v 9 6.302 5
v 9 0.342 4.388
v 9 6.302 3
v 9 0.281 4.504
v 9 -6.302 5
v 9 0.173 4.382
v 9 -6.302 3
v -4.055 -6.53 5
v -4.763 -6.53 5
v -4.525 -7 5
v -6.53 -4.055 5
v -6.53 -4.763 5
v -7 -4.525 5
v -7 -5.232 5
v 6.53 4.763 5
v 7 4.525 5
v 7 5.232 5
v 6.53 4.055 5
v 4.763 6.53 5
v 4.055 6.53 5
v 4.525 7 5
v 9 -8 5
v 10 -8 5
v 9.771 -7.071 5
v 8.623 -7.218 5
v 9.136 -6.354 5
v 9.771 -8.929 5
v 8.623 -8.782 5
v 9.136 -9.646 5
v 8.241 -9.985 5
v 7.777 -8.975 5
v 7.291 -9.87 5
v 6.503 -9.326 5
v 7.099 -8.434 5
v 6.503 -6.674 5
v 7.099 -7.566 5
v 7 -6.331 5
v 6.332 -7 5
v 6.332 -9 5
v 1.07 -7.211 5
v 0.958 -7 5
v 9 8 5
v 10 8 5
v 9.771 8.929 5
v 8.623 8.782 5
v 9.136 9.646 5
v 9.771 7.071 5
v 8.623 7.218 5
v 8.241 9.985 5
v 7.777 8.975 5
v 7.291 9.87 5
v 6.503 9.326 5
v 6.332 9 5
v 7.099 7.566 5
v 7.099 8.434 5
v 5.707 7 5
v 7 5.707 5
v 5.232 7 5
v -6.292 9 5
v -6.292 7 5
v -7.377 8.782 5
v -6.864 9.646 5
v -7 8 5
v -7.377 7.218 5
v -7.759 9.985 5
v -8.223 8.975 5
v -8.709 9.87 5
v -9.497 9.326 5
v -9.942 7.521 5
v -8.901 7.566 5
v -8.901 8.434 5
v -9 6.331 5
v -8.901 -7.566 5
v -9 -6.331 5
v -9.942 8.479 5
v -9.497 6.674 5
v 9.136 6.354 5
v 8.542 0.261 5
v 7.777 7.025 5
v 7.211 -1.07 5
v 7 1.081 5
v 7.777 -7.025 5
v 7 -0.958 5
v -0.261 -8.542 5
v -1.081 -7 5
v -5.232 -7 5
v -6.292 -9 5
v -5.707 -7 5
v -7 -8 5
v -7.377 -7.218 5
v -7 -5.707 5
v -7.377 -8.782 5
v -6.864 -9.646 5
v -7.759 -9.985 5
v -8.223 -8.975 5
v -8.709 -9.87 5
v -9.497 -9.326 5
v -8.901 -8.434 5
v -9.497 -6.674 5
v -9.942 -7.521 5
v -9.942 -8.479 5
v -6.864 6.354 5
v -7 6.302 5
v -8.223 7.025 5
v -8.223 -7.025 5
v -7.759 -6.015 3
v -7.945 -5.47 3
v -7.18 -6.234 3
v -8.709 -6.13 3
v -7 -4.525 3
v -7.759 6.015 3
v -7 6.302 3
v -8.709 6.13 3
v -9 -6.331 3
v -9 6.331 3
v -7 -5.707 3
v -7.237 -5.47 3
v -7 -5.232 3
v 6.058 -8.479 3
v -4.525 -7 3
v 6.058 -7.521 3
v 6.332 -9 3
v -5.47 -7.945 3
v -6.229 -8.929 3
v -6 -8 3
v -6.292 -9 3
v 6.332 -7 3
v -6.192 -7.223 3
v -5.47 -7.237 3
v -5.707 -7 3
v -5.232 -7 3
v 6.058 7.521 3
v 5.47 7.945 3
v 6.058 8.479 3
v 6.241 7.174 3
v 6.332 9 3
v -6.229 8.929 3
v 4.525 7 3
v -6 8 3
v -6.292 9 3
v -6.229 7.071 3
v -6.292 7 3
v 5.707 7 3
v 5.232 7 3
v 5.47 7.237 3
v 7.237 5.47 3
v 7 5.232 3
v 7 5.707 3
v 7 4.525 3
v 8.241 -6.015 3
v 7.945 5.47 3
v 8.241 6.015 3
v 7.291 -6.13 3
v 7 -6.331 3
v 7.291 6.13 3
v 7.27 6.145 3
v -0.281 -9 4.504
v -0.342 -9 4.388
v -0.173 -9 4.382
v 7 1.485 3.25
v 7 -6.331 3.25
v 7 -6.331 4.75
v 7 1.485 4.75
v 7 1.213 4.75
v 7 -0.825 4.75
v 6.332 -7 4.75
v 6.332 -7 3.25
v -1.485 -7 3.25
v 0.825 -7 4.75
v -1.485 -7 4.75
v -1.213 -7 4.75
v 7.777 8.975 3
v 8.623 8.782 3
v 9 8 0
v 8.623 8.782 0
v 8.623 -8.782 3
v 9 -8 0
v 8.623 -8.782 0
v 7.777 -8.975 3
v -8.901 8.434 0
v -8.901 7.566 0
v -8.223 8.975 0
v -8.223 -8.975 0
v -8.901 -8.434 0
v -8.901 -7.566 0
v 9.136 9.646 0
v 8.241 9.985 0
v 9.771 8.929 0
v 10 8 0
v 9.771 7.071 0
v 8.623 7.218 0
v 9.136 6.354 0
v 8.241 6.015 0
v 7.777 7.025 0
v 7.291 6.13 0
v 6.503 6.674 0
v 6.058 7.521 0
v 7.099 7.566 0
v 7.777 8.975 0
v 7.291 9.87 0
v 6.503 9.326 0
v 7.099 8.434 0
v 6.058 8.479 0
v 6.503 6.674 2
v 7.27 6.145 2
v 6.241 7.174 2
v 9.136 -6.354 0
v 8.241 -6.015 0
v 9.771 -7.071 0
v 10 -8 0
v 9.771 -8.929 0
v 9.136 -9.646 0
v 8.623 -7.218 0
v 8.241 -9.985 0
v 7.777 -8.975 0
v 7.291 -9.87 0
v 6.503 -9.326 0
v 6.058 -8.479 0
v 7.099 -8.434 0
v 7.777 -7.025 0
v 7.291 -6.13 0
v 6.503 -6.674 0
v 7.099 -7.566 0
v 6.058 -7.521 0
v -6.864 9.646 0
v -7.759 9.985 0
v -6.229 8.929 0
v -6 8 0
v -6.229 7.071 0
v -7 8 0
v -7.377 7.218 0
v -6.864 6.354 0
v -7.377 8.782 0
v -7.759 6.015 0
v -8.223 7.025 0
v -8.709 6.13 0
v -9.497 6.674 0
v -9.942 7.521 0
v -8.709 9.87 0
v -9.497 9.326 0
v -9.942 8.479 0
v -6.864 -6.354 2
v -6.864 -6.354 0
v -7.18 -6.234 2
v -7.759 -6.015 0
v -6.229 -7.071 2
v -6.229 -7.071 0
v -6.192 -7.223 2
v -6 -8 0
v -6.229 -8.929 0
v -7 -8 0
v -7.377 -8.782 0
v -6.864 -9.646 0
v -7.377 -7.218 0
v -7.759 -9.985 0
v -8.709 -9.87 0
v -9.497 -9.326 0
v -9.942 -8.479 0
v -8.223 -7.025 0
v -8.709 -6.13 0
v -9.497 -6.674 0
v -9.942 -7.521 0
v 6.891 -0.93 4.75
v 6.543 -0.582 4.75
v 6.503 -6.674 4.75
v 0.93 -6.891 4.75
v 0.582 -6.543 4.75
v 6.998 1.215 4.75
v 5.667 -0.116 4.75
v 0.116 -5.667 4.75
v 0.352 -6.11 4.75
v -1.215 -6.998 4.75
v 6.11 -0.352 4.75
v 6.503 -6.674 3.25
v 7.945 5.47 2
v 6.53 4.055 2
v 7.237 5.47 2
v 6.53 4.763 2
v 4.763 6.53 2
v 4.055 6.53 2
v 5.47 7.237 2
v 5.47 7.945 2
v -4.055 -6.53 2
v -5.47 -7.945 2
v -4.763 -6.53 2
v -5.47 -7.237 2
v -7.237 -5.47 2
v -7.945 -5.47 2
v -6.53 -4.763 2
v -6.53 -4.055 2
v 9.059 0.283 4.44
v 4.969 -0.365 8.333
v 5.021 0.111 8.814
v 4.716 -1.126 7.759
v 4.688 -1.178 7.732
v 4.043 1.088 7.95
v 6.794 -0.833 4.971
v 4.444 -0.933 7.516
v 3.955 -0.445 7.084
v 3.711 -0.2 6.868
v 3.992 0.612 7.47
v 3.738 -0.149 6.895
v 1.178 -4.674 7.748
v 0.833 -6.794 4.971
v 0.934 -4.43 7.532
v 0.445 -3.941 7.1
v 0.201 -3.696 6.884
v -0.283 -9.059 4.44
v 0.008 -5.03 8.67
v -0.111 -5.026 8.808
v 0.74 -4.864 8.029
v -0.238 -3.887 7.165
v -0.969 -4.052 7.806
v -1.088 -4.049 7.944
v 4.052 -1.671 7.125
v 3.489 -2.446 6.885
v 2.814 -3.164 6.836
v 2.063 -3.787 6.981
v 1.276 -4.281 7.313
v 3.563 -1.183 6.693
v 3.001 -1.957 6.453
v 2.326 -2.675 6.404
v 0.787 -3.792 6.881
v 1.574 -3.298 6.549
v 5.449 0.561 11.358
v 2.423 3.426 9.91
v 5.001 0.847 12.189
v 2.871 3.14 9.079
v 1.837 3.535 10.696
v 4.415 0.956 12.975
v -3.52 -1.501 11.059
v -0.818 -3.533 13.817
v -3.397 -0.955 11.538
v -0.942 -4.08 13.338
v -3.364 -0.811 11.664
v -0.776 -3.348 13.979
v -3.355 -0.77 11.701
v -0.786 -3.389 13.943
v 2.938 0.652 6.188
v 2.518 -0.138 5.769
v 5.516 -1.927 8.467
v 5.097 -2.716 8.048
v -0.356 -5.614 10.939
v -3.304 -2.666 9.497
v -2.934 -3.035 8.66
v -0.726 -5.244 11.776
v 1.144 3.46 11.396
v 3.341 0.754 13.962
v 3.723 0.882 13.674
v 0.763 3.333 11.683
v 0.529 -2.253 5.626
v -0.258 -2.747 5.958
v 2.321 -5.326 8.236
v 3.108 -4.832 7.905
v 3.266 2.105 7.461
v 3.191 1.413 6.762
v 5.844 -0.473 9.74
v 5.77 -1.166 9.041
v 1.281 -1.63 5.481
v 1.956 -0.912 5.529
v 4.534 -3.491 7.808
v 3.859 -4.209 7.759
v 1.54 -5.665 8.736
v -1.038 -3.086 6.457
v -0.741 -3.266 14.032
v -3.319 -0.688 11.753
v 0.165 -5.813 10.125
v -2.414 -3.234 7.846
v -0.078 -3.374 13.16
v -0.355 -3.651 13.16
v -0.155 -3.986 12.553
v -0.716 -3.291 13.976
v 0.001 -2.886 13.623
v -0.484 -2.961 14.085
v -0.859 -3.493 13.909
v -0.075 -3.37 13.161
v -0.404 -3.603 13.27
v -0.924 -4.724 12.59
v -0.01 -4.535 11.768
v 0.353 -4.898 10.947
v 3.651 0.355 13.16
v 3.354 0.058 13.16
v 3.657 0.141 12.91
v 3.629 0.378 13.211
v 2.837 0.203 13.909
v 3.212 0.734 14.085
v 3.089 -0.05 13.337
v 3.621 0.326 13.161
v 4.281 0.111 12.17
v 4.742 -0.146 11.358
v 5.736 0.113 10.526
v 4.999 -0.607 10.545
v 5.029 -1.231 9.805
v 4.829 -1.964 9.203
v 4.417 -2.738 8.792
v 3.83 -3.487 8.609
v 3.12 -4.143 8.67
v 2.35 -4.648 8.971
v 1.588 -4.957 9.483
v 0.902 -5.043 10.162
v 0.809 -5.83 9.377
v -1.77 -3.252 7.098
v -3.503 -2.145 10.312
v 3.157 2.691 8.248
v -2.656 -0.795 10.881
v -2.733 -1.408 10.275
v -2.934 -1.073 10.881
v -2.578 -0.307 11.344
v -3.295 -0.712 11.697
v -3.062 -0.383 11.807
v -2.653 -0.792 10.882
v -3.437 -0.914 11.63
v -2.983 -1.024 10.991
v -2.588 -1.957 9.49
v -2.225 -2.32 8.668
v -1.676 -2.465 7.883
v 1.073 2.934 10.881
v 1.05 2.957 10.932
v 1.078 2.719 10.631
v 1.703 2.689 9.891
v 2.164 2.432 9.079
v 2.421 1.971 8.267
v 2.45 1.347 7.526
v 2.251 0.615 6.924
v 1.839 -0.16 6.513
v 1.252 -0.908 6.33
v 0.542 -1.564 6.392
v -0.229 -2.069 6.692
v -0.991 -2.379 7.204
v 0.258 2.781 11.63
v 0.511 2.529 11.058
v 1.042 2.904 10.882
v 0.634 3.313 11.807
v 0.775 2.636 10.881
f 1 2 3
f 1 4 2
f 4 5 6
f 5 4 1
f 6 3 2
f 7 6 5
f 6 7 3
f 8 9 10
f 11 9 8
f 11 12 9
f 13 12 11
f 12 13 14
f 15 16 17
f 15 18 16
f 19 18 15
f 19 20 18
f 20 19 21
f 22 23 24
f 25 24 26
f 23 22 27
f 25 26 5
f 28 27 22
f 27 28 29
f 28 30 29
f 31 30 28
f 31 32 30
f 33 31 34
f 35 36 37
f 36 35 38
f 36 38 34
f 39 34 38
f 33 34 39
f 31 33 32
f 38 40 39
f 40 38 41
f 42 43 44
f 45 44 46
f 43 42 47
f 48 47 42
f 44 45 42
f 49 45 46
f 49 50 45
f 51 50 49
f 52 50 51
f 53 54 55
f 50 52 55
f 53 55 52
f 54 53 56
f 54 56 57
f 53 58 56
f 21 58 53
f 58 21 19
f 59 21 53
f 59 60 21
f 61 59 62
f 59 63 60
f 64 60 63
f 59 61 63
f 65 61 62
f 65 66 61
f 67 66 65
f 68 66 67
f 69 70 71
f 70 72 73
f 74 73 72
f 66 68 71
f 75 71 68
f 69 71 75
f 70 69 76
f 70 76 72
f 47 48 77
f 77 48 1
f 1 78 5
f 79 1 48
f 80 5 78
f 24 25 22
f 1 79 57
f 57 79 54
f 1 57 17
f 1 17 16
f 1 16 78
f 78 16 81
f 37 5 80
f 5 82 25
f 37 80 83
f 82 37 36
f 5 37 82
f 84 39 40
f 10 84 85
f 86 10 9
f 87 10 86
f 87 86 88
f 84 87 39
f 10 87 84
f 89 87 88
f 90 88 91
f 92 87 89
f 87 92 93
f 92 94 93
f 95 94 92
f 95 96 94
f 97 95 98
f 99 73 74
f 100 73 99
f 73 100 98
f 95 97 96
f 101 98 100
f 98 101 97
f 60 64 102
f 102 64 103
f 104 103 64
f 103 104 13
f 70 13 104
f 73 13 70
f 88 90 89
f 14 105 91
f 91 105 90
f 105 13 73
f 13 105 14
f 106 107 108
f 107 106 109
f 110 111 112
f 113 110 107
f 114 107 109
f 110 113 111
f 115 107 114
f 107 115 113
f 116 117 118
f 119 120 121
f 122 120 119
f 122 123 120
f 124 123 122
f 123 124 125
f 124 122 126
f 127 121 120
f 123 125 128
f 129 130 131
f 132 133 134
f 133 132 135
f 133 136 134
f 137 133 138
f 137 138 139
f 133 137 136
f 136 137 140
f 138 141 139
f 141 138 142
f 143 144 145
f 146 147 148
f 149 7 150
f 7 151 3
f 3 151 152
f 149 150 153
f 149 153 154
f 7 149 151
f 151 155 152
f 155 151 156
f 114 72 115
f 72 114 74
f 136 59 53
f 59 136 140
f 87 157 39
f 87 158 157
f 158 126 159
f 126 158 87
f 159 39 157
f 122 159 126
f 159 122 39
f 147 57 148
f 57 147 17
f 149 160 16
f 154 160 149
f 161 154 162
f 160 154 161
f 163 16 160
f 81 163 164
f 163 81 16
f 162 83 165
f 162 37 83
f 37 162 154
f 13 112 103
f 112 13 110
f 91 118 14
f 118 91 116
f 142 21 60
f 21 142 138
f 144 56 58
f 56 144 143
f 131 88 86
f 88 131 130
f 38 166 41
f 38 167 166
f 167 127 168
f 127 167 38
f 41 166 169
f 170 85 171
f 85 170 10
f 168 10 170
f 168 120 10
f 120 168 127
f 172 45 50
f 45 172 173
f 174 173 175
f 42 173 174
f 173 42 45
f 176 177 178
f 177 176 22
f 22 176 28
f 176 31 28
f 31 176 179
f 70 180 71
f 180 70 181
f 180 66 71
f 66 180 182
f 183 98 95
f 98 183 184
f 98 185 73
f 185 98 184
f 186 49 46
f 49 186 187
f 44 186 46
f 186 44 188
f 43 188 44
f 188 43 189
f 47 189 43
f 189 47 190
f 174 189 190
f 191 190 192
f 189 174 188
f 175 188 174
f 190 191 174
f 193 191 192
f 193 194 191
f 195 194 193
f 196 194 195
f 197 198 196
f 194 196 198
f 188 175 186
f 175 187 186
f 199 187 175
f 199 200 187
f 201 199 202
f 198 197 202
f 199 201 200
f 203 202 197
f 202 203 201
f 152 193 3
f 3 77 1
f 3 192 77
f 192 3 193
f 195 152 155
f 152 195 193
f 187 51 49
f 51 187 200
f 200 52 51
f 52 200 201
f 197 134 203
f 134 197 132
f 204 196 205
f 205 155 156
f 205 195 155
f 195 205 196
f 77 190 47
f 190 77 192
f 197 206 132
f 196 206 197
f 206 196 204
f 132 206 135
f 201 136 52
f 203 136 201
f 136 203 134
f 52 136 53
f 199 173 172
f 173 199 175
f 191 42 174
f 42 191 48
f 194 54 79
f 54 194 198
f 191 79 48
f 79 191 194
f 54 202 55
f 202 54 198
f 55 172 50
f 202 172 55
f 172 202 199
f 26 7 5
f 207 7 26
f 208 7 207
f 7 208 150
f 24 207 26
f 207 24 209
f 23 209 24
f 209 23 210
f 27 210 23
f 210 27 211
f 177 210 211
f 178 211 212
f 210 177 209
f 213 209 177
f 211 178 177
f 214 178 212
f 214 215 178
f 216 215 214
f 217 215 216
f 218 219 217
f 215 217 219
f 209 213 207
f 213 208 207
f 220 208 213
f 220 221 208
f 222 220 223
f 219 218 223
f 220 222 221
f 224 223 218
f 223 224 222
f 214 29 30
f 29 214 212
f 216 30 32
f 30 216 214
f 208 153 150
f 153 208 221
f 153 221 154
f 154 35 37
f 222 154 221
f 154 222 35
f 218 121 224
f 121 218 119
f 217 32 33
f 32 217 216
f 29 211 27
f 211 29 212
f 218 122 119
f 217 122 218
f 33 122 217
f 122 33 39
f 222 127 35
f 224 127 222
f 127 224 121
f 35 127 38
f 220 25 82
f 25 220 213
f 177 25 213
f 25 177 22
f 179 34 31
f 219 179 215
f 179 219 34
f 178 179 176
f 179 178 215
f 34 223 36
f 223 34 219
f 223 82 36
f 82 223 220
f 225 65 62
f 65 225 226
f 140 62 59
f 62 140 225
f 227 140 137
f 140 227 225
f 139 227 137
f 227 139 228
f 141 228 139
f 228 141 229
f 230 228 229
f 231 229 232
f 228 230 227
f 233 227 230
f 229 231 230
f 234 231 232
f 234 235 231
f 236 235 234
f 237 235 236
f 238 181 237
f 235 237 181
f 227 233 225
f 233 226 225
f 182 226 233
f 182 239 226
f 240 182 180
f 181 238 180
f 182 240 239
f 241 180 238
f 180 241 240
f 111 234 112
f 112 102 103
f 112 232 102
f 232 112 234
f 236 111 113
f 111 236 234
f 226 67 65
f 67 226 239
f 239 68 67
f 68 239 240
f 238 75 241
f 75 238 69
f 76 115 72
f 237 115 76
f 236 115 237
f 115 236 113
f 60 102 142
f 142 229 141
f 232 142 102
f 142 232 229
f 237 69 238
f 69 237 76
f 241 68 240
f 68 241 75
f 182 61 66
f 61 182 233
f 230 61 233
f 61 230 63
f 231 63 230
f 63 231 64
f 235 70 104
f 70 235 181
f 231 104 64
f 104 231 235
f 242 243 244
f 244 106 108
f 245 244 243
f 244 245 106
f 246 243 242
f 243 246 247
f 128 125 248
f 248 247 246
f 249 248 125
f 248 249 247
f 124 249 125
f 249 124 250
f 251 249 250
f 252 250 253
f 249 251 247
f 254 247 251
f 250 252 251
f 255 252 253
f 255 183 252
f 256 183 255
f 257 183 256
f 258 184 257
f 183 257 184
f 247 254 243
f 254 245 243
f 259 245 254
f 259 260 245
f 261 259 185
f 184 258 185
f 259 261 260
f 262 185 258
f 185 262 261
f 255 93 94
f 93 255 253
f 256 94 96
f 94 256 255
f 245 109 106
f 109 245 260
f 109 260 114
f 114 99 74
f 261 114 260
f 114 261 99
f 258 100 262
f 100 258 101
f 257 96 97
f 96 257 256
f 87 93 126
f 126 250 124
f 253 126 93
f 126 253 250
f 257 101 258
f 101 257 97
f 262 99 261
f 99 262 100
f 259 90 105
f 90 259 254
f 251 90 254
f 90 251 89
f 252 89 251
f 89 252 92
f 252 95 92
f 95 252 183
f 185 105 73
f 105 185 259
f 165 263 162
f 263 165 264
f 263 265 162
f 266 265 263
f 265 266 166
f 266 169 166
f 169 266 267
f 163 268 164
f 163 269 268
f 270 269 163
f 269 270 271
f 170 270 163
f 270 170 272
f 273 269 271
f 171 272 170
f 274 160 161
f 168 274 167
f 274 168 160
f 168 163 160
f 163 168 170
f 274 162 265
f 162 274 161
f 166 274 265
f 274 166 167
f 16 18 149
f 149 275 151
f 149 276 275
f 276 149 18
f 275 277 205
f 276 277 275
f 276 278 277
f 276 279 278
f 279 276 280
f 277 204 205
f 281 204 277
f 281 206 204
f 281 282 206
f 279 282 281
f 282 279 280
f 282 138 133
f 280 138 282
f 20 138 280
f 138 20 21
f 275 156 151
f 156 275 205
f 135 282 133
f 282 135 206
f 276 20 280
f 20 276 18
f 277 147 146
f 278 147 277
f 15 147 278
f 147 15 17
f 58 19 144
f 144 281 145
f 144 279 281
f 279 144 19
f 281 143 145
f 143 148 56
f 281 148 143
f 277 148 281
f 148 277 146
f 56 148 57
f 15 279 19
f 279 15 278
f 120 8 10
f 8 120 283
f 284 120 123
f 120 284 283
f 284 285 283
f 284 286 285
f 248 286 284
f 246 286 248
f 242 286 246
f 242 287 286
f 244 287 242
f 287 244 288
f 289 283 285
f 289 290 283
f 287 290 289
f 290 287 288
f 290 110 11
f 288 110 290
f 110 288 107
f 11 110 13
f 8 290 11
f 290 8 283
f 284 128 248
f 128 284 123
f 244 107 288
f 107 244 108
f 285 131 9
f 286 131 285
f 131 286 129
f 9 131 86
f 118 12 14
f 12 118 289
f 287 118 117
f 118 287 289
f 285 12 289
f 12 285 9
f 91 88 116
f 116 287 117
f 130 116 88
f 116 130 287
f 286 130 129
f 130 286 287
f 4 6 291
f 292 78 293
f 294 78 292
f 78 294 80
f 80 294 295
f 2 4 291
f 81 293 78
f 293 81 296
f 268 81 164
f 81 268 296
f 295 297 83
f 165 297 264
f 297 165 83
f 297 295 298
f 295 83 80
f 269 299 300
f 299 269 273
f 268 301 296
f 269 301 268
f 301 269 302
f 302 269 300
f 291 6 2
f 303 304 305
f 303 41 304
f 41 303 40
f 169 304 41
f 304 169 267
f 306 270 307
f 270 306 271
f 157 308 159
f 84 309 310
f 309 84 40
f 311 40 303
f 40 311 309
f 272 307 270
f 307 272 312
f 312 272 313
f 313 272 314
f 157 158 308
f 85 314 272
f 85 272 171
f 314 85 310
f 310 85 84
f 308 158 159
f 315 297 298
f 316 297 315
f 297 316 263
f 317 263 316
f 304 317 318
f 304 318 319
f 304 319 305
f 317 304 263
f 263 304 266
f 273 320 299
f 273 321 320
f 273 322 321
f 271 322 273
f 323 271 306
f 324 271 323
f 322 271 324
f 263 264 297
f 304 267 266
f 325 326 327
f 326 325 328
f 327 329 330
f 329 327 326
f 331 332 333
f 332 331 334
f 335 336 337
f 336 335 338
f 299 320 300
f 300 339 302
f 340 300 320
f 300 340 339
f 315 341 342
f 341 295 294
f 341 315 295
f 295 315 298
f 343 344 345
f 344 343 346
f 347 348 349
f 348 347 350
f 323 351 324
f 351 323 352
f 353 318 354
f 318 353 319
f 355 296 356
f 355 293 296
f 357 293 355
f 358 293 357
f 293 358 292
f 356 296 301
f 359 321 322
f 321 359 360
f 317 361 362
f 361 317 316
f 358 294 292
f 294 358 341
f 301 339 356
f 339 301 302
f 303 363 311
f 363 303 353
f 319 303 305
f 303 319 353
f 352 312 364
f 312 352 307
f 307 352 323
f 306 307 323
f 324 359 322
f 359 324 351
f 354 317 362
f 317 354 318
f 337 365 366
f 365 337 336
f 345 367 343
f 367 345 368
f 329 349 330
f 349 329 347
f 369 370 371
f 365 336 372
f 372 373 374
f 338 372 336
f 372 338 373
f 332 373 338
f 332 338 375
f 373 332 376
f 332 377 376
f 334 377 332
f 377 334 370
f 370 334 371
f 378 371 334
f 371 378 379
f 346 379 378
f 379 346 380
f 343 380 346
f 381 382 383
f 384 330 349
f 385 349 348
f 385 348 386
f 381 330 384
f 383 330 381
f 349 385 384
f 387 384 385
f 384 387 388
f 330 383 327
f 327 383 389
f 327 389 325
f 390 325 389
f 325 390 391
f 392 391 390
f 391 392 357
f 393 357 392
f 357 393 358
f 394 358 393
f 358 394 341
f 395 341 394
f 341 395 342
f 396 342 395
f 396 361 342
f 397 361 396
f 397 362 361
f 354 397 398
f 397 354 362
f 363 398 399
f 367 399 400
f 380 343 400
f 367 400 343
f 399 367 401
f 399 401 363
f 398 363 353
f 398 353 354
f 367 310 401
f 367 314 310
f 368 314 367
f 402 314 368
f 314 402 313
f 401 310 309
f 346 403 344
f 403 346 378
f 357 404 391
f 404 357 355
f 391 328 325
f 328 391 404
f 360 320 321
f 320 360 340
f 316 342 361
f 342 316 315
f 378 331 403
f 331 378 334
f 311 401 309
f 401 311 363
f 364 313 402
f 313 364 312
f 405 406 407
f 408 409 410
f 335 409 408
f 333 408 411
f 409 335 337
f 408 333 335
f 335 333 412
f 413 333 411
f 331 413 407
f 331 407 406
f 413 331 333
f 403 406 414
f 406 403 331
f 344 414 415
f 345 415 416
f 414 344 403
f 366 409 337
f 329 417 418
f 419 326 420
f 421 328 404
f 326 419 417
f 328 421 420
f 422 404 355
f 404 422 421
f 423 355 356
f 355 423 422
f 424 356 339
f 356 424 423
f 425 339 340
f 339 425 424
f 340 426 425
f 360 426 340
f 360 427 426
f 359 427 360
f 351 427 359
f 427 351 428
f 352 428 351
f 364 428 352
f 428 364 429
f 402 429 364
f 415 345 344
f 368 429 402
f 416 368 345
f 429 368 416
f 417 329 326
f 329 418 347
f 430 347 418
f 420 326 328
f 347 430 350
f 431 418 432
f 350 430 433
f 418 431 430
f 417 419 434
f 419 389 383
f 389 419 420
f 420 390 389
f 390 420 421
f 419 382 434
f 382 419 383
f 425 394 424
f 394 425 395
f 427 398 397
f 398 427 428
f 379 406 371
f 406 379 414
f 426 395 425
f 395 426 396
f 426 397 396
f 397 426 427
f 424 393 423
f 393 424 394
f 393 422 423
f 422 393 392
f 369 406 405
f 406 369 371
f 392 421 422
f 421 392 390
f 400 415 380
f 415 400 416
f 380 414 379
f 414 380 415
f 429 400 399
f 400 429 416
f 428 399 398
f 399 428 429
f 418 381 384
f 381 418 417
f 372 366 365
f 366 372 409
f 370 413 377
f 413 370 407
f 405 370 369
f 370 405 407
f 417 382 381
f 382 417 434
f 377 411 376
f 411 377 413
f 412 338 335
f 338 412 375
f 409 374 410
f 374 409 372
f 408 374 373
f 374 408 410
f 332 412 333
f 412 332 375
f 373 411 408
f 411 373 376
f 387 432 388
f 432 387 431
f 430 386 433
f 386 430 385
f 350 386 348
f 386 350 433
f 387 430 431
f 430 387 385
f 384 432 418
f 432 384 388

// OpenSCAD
/*
The code is automatically
generated from [pepperfish-camera.dats]
*/

$fa=1.0; $fs=1.0;

module
camera() {
  d = 6.8;
  thickness = 1.63;

  d_ = 8.5;
  thickness_ = 4.3;

  depth = 12;
  width = 11;
  height = 11;
  lens = [4, 10];

  union () {
    difference() {
      union() {
        translate([d/2, -d/2, 0]) rotate([0, 0, 30])   cube([thickness, 10, thickness], center=true);
        translate([-d/2, -d/2, 0]) rotate([0, 0, -30]) cube([thickness, 10, thickness], center=true);
        translate([0, -d/2 -thickness/2, 0]) cube([d,d/2, thickness/2], center=true);
        translate([0, -d/2 -thickness, 0]) cube([d+thickness, d/2, thickness/2], center=true);
       }
          cylinder(h=thickness * 2, r=d/2, center=true);
          translate([0, -d/2-6, 0]) cube([d*2, thickness*2, thickness*2], center=true);
        }
        difference() {
          cylinder(thickness_, r=d_/2, center=true);
          cylinder(2*thickness_, r=d_/2-1, center=true);
          translate([0, d_/2, 0]) cube([d_/1.5, d_/2, thickness_*4], center=true);
        }
        translate([-sqrt(2)/2*d_/2.30, sqrt(2)/2*d_/2.25, 0]) cylinder(h=thickness_, r=thickness_/7.5, center=true);
        translate([sqrt(2)/2*d_/2.30, sqrt(2)/2*d_/2.25, 0])  cylinder(h=thickness_, r=thickness_/7.5, center=true);
    }

  }
union()
{
  union()
  {
    difference()
    {
      translate([0.00, 0.00, 4.00])
      {
        cube([18, 18, 2], center=true);
      }
      cube([14.00, 14.00, 20.00], center=true);
      translate([8.00, 8.00, 0.00])
      {
        cylinder(h=20.00, r=1.00, center=true);
      }
      translate([8.00, -8.00, 0.00])
      {
        cylinder(h=20.00, r=1.00, center=true);
      }
      translate([-8.00, 8.00, 0.00])
      {
        cylinder(h=20.00, r=1.00, center=true);
      }
      translate([-8.00, -8.00, 0.00])
      {
        cylinder(h=20.00, r=1.00, center=true);
      }
    }
    translate([8, 8, 0])
    {
      difference()
      {
        cylinder(h=5.00, r=2.00, center=false);
        cylinder(h=15.00, r=1.00, center=true);
      }
    }
    translate([8, -8, 0])
    {
      difference()
      {
        cylinder(h=5.00, r=2.00, center=false);
        cylinder(h=15.00, r=1.00, center=true);
      }
    }
    translate([-8, 8, 0])
    {
      difference()
      {
        cylinder(h=5.00, r=2.00, center=false);
        cylinder(h=15.00, r=1.00, center=true);
      }
    }
    translate([-8, -8, 0])
    {
      difference()
      {
        cylinder(h=5.00, r=2.00, center=false);
        cylinder(h=15.00, r=1.00, center=true);
      }
    }
    difference()
    {
      translate([-2.00, -8.00, 3.25])
      {
        cube([10.00, 10.00, 1.50], center=false);
      }
      rotate([0, 0, 45])
      {
        translate([-8.00, -3.90, 0.00])
        {
          cube([16.00, 16.00, 20.00], center=false);
        }
      }
      translate([8.00, -8.00, 0.00])
      {
        cylinder(h=10.00, r=2.00, center=true);
      }
    }
    translate([6.00, 6.00, 3.50])
    {
      rotate([0.00, 0.00, -45.00])
      {
        difference()
        {
          cube([3.50, 2.00, 3.00], center=true);
          cube([2.50, 1.00, 6.00], center=true);
        }
      }
    }
    translate([-6.00, -6.00, 3.50])
    {
      rotate([0.00, 0.00, -45.00])
      {
        difference()
        {
          cube([3.50, 2.00, 3.00], center=true);
          cube([2.50, 1.00, 6.00], center=true);
        }
      }
    }
  }
  rotate([58, 0, 45])
  {
    translate([0.00, 7.80, 6.80])
    {
      camera();
    }
  }
}

/* end of [pepperfish-camera_dats.scad] */
